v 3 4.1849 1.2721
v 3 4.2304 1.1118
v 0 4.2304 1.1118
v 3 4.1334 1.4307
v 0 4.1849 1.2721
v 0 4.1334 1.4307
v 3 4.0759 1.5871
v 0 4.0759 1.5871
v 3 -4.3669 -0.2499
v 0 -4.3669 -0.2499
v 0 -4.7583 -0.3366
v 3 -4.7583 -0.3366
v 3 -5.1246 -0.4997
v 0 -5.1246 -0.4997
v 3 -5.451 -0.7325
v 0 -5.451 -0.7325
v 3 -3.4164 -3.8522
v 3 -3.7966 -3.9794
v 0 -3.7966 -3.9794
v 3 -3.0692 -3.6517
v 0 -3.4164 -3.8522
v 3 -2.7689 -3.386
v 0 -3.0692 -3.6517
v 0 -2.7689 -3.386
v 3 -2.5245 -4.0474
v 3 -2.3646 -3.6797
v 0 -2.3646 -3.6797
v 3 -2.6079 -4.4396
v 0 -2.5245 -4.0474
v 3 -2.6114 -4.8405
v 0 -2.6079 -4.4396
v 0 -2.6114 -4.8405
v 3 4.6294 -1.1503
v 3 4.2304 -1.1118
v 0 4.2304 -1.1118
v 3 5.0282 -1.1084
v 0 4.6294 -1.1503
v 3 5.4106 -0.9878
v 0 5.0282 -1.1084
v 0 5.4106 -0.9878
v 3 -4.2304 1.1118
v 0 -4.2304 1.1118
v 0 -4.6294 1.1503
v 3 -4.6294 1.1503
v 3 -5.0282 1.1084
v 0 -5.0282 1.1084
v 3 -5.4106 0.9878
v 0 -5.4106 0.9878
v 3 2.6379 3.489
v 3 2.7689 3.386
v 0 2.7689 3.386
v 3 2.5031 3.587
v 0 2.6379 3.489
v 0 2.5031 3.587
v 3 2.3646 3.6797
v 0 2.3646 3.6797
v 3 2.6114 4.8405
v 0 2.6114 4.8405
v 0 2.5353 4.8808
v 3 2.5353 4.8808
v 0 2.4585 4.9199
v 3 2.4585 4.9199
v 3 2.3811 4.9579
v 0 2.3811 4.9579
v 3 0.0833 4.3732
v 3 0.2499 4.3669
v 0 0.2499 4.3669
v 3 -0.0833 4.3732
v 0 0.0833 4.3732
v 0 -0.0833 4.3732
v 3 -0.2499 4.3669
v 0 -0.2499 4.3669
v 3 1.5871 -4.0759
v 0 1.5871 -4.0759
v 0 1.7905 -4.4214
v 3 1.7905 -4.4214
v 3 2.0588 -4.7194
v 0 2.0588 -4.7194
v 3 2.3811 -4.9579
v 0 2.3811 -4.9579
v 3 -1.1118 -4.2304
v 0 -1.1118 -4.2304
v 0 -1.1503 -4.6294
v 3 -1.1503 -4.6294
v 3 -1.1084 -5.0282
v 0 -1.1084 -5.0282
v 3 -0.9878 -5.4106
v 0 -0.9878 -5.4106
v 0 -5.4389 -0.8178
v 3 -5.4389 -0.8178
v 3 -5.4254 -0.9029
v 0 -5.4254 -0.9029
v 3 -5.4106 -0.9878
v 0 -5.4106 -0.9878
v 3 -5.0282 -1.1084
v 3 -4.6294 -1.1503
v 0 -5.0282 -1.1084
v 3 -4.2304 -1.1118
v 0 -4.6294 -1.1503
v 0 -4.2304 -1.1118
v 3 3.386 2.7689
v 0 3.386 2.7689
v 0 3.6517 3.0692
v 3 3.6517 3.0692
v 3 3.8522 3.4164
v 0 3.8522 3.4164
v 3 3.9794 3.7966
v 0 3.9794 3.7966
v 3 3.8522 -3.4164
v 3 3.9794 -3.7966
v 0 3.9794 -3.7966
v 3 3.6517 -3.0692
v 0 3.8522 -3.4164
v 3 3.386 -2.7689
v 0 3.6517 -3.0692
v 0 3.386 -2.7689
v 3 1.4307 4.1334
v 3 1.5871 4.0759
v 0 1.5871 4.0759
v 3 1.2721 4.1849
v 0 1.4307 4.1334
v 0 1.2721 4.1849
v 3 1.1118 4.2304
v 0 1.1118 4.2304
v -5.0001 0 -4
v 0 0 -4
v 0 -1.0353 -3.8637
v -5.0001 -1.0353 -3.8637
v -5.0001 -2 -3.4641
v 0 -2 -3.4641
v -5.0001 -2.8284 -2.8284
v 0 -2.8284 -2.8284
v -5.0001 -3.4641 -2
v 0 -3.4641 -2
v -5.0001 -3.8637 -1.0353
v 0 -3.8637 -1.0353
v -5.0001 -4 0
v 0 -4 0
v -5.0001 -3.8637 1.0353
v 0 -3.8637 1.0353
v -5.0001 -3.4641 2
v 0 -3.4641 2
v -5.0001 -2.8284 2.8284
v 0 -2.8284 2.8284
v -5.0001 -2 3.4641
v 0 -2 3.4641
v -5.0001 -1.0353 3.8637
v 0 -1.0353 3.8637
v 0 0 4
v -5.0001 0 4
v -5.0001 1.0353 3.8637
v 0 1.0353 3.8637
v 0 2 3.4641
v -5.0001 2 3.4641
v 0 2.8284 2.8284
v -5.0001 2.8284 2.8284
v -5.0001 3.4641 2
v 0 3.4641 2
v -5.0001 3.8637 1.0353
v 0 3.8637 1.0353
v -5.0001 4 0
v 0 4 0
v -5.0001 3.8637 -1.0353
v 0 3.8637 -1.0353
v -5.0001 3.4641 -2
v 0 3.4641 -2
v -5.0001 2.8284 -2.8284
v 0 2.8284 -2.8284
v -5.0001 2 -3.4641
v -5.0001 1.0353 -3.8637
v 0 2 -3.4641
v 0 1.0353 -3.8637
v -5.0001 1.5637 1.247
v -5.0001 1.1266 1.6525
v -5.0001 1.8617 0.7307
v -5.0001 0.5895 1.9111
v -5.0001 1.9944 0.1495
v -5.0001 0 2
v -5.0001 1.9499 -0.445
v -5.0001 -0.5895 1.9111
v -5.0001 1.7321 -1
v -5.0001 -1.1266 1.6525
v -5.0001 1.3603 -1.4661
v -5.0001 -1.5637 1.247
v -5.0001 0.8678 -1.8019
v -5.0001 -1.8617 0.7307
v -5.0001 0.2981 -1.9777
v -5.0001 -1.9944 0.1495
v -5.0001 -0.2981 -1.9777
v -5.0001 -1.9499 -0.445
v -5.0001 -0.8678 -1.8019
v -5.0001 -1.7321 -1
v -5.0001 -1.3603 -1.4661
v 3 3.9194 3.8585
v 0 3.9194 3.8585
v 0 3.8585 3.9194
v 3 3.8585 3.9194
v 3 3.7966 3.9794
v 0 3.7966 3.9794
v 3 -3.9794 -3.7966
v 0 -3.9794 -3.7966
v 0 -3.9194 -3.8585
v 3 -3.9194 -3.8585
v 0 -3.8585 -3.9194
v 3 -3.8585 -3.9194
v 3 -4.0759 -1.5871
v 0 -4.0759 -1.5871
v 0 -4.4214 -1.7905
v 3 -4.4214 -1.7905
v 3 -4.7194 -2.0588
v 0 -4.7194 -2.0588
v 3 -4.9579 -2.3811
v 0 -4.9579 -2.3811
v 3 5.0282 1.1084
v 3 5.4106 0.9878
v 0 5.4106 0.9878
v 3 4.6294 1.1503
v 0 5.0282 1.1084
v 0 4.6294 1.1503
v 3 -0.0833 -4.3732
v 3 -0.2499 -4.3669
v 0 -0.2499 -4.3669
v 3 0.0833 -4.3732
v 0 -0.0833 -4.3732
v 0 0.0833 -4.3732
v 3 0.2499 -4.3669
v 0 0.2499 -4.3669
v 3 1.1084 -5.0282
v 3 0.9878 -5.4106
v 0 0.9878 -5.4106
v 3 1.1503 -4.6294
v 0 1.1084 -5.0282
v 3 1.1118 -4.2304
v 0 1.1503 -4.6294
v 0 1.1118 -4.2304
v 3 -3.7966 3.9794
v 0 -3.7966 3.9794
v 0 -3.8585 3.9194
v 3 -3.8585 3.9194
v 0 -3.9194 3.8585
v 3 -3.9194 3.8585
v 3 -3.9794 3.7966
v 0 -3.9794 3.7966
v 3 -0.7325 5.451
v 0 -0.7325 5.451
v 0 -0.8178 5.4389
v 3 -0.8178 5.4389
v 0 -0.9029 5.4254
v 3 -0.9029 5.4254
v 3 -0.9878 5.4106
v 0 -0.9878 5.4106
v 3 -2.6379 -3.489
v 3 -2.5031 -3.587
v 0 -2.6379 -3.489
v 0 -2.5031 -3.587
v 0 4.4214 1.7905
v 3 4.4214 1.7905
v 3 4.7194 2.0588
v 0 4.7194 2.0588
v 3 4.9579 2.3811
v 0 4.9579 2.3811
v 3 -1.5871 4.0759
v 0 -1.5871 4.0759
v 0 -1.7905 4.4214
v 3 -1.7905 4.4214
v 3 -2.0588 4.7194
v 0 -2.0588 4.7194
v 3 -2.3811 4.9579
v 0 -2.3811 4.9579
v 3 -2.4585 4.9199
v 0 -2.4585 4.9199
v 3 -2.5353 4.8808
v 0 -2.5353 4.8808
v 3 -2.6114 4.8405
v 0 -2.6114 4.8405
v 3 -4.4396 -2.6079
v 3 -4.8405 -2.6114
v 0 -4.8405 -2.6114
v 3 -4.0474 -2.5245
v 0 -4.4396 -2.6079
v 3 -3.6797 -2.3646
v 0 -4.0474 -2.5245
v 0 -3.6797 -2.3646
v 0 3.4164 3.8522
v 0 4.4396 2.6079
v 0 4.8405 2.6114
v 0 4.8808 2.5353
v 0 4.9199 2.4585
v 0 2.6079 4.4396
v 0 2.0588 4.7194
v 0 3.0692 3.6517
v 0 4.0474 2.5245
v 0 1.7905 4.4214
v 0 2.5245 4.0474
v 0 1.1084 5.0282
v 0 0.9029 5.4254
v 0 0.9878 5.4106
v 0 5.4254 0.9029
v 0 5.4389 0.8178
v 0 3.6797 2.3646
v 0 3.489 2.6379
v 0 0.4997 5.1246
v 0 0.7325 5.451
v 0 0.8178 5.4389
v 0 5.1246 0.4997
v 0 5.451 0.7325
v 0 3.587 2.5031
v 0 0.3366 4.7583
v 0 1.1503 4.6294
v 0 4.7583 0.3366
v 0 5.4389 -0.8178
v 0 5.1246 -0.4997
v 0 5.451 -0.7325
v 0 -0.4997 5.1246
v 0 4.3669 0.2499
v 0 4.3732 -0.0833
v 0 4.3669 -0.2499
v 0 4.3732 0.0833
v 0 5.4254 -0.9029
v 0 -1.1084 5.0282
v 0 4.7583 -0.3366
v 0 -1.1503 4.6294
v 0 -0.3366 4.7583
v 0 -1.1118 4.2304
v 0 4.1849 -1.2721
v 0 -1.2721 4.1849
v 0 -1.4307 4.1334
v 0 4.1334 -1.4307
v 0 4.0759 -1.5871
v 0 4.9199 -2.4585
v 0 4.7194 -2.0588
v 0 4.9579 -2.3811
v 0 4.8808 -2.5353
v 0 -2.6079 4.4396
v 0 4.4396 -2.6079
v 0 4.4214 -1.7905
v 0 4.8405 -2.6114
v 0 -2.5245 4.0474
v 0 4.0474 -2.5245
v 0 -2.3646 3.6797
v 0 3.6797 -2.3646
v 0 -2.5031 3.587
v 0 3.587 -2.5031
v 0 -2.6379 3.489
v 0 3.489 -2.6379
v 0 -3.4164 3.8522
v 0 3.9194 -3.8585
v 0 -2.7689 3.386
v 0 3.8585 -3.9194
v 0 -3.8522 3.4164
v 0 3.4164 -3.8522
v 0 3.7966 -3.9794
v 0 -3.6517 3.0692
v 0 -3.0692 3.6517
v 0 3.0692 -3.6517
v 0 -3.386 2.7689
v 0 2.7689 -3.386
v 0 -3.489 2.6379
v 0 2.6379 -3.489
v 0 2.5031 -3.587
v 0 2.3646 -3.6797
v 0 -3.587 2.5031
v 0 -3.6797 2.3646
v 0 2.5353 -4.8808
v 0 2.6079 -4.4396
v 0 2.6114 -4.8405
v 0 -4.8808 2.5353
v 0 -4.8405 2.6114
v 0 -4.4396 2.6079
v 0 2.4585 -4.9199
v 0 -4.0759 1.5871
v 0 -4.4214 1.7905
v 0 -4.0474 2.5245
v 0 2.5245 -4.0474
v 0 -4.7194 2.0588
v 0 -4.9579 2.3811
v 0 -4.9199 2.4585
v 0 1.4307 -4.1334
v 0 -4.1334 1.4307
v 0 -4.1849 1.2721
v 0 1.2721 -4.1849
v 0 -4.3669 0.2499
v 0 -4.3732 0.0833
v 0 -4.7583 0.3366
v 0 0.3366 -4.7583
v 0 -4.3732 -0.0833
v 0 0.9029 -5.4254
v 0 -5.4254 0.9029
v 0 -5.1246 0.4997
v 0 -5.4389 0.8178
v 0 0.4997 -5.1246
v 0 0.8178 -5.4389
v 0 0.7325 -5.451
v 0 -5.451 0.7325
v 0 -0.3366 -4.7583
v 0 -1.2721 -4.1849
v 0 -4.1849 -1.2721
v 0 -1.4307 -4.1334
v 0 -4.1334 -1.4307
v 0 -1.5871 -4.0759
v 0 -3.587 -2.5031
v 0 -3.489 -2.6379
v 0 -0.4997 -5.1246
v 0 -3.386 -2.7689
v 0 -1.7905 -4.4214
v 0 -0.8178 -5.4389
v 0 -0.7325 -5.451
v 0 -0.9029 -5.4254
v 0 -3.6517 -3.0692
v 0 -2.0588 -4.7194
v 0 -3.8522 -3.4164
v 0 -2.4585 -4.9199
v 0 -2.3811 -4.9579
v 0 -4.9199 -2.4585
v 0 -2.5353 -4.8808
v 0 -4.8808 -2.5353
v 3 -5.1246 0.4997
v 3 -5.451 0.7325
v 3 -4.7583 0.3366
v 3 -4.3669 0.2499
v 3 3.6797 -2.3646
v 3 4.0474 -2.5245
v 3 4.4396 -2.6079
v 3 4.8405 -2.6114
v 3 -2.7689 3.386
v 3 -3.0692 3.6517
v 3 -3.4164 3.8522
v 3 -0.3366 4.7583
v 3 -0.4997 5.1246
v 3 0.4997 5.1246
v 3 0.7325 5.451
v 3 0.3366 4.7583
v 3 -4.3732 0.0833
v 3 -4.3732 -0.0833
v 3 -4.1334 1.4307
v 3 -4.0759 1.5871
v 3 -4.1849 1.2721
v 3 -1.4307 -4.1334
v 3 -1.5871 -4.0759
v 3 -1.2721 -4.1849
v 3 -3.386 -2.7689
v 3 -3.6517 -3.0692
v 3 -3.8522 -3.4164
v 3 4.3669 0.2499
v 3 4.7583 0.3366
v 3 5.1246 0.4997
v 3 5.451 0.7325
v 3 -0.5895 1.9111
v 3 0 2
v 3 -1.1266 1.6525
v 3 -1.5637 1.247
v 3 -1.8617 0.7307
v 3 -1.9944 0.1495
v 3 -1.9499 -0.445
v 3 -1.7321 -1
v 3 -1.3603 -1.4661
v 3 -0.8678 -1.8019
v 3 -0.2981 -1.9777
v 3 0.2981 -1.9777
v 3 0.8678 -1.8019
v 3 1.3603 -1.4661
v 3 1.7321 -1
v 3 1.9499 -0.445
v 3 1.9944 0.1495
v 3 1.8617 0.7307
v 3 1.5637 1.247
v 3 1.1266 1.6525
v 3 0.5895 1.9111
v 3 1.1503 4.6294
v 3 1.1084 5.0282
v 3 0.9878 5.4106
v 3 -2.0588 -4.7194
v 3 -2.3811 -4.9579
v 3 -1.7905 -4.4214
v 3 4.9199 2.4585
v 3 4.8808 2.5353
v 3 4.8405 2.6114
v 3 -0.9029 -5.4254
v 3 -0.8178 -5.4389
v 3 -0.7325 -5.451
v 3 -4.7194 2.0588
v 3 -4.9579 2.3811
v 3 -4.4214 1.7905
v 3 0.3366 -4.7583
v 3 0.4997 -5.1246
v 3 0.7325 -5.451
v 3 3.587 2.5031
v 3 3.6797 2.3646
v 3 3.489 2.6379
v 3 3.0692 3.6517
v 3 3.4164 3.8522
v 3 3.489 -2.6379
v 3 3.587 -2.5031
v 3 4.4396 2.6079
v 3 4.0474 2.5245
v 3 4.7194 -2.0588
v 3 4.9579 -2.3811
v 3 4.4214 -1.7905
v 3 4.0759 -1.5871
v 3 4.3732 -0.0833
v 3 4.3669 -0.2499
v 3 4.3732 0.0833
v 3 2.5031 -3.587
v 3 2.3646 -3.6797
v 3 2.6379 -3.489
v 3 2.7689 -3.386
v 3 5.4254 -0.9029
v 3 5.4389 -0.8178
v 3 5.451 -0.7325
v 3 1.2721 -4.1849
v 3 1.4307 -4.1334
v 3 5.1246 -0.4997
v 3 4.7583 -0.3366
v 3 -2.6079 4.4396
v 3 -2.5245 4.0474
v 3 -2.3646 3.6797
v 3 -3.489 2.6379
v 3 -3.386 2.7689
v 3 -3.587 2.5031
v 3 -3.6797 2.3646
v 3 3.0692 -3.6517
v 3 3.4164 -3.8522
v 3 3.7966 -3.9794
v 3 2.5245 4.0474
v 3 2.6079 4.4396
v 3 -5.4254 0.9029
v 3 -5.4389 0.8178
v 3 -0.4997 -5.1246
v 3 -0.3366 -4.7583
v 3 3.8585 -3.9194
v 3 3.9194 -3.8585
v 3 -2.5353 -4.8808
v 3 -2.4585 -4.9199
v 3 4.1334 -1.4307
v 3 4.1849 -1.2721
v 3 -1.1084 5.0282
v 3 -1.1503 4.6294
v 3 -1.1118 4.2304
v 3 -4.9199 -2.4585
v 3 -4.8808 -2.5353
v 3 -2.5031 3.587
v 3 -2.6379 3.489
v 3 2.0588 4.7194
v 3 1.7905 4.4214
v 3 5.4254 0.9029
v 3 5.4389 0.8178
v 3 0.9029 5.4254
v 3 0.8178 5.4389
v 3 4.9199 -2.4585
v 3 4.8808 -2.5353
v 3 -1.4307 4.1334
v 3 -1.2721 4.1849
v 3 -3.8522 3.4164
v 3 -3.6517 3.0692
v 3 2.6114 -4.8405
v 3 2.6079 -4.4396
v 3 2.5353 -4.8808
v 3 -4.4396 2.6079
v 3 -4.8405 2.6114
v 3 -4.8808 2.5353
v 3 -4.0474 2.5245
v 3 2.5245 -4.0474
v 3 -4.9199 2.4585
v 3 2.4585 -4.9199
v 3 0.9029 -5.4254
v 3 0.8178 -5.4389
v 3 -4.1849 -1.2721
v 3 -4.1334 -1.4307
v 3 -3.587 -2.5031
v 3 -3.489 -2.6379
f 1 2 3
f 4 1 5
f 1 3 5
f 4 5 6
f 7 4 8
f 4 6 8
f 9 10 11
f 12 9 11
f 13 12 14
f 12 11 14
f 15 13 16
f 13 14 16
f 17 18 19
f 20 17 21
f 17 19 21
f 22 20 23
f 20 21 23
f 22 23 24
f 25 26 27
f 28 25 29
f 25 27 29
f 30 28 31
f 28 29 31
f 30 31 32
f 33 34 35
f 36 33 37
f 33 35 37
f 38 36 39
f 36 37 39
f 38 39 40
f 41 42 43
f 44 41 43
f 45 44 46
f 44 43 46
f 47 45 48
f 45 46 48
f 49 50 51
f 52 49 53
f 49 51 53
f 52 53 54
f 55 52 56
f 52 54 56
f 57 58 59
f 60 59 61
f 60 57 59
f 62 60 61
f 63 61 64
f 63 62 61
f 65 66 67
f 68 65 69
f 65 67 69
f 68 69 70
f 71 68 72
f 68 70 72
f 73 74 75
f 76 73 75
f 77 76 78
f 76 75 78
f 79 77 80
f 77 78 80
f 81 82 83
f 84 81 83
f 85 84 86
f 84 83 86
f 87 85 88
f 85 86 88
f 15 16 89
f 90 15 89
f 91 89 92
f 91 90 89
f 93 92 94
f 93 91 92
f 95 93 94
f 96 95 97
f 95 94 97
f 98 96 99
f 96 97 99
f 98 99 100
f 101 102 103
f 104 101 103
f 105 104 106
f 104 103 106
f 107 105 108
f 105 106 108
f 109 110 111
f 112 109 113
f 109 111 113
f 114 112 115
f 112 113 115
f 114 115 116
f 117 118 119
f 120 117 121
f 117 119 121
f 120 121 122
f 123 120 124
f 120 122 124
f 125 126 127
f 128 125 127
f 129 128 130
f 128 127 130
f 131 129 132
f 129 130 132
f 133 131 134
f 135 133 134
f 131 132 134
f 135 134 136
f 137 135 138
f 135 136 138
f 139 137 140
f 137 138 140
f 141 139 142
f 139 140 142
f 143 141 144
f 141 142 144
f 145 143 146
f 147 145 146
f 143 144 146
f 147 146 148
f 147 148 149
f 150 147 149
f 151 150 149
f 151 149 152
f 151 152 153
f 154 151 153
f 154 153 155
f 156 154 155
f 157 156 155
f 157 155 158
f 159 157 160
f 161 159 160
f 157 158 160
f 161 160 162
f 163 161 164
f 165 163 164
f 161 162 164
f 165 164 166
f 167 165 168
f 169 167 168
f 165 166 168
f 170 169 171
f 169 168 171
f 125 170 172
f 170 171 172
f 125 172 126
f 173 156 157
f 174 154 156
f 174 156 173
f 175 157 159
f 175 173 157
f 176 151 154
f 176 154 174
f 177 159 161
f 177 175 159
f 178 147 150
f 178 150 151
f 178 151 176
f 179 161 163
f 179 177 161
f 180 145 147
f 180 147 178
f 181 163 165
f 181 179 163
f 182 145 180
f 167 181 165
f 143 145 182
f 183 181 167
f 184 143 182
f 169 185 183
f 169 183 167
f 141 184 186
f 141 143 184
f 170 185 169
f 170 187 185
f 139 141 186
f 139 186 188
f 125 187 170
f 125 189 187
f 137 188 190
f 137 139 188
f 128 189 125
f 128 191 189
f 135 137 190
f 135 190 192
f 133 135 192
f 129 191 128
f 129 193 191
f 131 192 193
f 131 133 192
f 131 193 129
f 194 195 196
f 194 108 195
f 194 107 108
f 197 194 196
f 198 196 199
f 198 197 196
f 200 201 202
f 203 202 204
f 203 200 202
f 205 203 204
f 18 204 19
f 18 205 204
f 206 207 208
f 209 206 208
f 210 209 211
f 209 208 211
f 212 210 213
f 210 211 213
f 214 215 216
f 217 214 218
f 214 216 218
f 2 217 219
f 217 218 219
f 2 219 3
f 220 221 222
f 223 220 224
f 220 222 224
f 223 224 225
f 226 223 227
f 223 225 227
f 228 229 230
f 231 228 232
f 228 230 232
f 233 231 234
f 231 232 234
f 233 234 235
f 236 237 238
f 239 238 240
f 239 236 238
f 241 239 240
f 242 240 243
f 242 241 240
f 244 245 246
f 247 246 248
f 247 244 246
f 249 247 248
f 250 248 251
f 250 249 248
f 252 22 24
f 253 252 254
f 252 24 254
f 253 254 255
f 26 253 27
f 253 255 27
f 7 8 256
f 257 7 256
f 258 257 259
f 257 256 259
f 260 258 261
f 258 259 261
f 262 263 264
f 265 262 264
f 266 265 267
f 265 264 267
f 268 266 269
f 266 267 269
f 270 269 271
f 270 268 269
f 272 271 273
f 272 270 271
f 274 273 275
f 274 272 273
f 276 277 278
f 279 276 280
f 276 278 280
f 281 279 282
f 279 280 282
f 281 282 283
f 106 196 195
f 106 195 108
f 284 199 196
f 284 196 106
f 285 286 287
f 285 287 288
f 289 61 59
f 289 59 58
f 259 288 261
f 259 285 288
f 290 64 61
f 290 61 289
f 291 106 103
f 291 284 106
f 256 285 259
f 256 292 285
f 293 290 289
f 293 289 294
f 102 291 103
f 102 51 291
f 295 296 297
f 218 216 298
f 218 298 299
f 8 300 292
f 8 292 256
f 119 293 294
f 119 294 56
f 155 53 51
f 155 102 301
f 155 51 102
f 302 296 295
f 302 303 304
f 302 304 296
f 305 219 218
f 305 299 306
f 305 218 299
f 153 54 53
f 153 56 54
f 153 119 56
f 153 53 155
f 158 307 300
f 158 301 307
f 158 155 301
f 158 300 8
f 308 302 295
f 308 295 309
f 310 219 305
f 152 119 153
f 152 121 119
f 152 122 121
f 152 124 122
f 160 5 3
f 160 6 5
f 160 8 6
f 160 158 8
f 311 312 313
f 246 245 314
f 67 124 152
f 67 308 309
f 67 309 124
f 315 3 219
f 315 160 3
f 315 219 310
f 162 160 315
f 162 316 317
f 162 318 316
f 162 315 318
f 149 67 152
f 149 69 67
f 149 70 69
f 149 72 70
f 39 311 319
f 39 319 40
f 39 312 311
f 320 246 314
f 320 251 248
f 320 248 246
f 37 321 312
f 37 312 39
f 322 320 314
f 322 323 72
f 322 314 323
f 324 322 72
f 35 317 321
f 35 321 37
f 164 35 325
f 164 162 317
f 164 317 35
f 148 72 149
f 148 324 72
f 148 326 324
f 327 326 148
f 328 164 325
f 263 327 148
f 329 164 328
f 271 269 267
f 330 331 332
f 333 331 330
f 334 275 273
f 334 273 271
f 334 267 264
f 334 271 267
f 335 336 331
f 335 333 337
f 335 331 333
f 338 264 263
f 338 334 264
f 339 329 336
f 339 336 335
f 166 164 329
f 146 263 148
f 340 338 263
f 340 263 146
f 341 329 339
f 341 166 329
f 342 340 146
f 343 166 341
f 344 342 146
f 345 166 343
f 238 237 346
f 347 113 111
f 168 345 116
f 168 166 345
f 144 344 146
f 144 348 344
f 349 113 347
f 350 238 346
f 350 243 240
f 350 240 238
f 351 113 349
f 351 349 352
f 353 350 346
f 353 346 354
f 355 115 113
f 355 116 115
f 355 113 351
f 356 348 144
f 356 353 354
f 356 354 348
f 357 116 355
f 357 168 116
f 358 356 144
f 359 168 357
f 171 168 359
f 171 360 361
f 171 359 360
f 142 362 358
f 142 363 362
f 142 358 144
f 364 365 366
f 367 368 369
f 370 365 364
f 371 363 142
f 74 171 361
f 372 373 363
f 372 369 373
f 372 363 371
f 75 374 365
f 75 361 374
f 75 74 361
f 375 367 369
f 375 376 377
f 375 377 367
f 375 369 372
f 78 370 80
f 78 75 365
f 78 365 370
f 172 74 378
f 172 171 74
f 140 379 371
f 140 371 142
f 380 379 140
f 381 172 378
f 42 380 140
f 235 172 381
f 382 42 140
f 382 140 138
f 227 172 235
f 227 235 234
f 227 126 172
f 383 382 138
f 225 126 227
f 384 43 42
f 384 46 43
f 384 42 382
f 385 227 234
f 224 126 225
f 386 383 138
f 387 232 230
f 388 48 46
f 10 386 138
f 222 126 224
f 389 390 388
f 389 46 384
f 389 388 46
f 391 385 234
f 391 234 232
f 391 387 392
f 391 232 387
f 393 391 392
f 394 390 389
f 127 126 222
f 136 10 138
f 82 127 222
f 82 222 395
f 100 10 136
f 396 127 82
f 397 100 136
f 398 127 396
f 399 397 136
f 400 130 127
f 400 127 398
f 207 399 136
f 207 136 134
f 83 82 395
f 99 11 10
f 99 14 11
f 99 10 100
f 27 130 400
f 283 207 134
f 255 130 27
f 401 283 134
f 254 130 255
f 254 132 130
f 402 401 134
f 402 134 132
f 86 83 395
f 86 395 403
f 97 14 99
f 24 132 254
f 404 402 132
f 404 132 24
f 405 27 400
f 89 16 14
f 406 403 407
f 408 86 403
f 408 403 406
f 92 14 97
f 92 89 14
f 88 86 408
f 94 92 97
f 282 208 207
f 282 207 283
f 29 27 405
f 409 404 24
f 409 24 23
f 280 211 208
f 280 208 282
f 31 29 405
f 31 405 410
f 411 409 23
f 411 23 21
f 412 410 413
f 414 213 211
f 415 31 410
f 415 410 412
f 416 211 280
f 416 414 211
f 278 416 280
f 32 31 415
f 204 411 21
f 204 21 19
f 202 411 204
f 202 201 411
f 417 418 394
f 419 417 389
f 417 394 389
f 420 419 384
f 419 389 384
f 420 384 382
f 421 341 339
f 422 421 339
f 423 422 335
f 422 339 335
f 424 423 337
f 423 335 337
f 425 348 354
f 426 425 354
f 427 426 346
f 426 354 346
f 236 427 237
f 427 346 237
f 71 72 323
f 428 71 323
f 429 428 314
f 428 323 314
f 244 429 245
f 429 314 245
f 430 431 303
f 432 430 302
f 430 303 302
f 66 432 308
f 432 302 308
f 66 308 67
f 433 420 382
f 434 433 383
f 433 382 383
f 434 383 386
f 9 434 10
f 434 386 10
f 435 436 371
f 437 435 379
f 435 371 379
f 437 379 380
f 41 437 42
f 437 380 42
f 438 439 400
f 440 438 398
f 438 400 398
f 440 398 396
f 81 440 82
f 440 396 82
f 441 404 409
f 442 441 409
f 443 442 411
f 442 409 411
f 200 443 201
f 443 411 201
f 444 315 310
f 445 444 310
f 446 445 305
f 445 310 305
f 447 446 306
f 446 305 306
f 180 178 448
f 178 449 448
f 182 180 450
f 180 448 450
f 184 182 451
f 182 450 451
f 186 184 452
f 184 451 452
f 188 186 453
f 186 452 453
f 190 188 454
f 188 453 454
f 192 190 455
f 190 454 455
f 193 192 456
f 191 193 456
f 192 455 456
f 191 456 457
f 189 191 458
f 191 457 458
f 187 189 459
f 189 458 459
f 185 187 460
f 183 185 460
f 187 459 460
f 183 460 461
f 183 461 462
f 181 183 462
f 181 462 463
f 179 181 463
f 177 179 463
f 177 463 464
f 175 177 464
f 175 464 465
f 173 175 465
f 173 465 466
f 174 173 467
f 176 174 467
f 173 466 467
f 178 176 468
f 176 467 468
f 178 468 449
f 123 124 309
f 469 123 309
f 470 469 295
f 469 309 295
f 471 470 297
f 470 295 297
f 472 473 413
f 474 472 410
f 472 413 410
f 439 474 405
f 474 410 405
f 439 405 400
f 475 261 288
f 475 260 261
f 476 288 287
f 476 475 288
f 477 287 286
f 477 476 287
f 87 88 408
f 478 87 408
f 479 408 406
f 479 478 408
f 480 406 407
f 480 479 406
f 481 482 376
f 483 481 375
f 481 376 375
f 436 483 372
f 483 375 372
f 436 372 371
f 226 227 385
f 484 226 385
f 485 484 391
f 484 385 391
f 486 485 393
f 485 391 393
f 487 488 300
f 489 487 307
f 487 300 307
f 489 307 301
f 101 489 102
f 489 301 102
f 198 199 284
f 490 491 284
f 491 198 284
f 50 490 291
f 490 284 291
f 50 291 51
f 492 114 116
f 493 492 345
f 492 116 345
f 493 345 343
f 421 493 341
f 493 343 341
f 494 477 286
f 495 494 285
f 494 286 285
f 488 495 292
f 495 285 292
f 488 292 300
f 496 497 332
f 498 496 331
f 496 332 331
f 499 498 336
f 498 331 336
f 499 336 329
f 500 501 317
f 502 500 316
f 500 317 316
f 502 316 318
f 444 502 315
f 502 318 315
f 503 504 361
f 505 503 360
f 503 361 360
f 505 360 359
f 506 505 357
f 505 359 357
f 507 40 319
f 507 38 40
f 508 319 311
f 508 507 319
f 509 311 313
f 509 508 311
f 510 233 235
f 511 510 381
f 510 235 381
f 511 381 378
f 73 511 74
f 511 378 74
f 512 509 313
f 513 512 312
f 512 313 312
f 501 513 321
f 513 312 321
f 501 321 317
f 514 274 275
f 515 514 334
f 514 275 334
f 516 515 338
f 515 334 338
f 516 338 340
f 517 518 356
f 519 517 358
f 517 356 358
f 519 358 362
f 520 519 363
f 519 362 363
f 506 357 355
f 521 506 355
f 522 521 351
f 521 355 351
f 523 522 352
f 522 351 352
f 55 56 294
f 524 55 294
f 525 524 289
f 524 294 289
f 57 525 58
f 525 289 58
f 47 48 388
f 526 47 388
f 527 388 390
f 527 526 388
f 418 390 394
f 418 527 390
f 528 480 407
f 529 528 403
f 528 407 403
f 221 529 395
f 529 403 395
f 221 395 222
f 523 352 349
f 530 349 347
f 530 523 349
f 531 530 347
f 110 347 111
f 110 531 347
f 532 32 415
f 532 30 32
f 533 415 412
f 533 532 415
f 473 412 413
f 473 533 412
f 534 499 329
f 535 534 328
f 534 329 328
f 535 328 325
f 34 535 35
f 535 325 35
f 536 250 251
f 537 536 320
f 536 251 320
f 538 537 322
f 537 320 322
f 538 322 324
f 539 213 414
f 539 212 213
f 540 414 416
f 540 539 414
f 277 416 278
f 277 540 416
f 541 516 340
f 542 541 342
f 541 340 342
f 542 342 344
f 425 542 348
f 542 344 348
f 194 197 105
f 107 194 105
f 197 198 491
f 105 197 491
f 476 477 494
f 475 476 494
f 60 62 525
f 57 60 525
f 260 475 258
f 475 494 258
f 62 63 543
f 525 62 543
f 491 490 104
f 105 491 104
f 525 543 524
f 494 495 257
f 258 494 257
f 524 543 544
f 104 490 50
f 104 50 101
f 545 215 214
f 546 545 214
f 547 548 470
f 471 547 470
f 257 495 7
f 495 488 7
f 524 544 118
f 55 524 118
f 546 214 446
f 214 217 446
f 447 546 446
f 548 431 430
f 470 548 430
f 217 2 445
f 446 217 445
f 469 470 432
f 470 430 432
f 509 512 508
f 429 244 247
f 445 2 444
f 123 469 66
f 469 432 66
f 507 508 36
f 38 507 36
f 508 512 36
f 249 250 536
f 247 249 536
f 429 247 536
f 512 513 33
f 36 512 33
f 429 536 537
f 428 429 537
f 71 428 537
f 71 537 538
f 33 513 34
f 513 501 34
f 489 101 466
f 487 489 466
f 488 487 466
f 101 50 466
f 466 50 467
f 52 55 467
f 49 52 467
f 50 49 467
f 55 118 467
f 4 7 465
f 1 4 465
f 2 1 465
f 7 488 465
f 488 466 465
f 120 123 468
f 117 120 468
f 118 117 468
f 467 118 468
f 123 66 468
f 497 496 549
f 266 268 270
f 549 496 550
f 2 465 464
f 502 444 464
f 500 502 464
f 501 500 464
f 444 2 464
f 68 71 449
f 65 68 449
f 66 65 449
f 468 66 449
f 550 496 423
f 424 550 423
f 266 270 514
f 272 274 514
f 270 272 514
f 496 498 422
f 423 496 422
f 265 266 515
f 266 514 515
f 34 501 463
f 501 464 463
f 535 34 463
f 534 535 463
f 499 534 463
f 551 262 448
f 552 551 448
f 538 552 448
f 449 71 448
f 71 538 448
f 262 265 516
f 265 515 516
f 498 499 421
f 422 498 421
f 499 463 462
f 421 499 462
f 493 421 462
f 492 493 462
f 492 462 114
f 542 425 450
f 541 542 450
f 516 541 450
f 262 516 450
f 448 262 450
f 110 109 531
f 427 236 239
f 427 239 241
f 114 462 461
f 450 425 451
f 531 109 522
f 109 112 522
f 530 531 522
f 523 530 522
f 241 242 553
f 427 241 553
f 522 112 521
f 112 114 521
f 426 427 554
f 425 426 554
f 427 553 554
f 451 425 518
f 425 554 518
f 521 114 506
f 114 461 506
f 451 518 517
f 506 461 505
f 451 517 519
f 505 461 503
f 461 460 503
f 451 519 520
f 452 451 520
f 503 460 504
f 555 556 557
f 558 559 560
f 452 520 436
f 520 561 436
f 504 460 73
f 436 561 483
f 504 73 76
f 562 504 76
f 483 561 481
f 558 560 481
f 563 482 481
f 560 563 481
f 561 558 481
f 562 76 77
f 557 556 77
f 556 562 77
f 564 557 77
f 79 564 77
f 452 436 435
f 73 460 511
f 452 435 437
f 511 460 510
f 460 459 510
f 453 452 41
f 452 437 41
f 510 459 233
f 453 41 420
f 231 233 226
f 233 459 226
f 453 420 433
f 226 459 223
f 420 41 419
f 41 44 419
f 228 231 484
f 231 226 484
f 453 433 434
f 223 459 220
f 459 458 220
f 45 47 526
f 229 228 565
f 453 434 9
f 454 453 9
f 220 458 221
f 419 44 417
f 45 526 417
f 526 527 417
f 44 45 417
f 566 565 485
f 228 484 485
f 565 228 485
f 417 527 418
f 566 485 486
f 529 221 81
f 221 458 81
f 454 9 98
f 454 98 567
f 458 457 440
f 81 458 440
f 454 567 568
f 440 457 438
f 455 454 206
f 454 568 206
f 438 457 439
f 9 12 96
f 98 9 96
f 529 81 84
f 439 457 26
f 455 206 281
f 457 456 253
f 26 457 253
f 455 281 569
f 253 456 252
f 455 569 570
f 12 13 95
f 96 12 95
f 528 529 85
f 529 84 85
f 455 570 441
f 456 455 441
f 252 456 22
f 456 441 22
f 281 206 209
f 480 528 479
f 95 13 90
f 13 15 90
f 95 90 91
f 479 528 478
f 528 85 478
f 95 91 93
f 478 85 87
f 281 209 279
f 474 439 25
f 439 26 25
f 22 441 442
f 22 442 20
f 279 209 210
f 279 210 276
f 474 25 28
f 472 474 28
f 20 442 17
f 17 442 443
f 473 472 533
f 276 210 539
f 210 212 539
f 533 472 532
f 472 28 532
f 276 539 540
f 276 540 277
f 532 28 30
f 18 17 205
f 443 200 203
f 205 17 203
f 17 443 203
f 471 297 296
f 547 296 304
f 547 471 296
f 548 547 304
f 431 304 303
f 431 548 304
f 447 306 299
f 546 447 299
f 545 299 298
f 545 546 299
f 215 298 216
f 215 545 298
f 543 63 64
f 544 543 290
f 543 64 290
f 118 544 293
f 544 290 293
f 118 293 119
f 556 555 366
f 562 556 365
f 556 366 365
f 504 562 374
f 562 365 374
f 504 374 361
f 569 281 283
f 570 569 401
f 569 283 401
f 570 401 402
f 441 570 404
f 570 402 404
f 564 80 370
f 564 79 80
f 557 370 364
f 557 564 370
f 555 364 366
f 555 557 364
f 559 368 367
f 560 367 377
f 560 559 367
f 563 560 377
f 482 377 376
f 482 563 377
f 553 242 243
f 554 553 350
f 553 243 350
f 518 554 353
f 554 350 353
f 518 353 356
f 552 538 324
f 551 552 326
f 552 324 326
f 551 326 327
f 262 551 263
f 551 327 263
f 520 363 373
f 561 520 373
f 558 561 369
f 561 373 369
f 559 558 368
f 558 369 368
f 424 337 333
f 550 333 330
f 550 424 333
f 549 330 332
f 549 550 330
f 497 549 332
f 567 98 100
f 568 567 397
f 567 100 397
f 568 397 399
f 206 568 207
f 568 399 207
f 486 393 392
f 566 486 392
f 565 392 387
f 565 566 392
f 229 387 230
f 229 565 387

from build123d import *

# Parameters (mm, degrees)
BASPROSKE_W      = 3
BASPROSKE_H      = 5.5
TOOTHCUT_DEPTH   = 9.336666
TEETHCUTS_COUNT  = 20
TEETHCUTS_ANGLE  = 342
HUBNEAONESKE_R   = 4
HUBNEARONE_DEPTH = 5.0000508
BORSKE_R         = 2
BORE_DEPTH       = 8.0000508


with BuildPart() as part:
    # BasProSke → Base-Revolve (revolve)
    with BuildSketch(Plane(origin=(0, 0, 0), x_dir=(1, 0, 0), z_dir=(0, 1, 0)), mode=Mode.PRIVATE) as base_revolve_sk:
        with Locations((1.5, 2.75)):
            Rectangle(BASPROSKE_W, BASPROSKE_H)
    revolve(base_revolve_sk.sketch.rotate(Axis((-10, 0, 0), (1, 0, 0)), 180), axis=Axis((-10, 0, 0), (1, 0, 0)))

    # TooCutSke → ToothCut (cut, through all)
    with BuildSketch(Plane(origin=(0, 0, 0), x_dir=(0, 0, -1), z_dir=(1, 0, 0))):
        with BuildLine():
            ThreePointArc((0.249903181, 4.366855207), (0, 4.374), (-0.249903181, 4.366855207))
            ThreePointArc((-0.249903181, 4.366855207), (-0.415207844, 4.95951031), (-0.752843848, 5.473871692))
            ThreePointArc((-0.752843848, 5.473871692), (0, 5.5254), (0.752843848, 5.473871692))
            ThreePointArc((0.752843848, 5.473871692), (0.415207844, 4.95951031), (0.249903181, 4.366855207))
        make_face()
    toothcut = extrude(amount=TOOTHCUT_DEPTH, mode=Mode.SUBTRACT)

    # TeethCuts: ToothCut ×20 about axis
    teethcuts_axis = Axis((-10, 0, 0), (1, 0, 0))
    for i in range(1, TEETHCUTS_COUNT):
        add(toothcut.rotate(teethcuts_axis, i * TEETHCUTS_ANGLE / (TEETHCUTS_COUNT - 1)), mode=Mode.SUBTRACT)

    # HubNeaOneSke → HubNearOne (add)
    with BuildSketch(Plane.ZY):
        with Locations(Location((0, 0, 0), (0, 0, 180))):
            Circle(HUBNEAONESKE_R)
    extrude(amount=HUBNEARONE_DEPTH)

    # BorSke → Bore (cut, symmetric)
    with BuildSketch(Plane(origin=(0, 0, 0), x_dir=(0, 0, -1), z_dir=(1, 0, 0))):
        with Locations(Location((0, 0, 0), (0, 0, 180))):
            Circle(BORSKE_R)
    extrude(amount=BORE_DEPTH, both=True, mode=Mode.SUBTRACT)


solid = part.part
